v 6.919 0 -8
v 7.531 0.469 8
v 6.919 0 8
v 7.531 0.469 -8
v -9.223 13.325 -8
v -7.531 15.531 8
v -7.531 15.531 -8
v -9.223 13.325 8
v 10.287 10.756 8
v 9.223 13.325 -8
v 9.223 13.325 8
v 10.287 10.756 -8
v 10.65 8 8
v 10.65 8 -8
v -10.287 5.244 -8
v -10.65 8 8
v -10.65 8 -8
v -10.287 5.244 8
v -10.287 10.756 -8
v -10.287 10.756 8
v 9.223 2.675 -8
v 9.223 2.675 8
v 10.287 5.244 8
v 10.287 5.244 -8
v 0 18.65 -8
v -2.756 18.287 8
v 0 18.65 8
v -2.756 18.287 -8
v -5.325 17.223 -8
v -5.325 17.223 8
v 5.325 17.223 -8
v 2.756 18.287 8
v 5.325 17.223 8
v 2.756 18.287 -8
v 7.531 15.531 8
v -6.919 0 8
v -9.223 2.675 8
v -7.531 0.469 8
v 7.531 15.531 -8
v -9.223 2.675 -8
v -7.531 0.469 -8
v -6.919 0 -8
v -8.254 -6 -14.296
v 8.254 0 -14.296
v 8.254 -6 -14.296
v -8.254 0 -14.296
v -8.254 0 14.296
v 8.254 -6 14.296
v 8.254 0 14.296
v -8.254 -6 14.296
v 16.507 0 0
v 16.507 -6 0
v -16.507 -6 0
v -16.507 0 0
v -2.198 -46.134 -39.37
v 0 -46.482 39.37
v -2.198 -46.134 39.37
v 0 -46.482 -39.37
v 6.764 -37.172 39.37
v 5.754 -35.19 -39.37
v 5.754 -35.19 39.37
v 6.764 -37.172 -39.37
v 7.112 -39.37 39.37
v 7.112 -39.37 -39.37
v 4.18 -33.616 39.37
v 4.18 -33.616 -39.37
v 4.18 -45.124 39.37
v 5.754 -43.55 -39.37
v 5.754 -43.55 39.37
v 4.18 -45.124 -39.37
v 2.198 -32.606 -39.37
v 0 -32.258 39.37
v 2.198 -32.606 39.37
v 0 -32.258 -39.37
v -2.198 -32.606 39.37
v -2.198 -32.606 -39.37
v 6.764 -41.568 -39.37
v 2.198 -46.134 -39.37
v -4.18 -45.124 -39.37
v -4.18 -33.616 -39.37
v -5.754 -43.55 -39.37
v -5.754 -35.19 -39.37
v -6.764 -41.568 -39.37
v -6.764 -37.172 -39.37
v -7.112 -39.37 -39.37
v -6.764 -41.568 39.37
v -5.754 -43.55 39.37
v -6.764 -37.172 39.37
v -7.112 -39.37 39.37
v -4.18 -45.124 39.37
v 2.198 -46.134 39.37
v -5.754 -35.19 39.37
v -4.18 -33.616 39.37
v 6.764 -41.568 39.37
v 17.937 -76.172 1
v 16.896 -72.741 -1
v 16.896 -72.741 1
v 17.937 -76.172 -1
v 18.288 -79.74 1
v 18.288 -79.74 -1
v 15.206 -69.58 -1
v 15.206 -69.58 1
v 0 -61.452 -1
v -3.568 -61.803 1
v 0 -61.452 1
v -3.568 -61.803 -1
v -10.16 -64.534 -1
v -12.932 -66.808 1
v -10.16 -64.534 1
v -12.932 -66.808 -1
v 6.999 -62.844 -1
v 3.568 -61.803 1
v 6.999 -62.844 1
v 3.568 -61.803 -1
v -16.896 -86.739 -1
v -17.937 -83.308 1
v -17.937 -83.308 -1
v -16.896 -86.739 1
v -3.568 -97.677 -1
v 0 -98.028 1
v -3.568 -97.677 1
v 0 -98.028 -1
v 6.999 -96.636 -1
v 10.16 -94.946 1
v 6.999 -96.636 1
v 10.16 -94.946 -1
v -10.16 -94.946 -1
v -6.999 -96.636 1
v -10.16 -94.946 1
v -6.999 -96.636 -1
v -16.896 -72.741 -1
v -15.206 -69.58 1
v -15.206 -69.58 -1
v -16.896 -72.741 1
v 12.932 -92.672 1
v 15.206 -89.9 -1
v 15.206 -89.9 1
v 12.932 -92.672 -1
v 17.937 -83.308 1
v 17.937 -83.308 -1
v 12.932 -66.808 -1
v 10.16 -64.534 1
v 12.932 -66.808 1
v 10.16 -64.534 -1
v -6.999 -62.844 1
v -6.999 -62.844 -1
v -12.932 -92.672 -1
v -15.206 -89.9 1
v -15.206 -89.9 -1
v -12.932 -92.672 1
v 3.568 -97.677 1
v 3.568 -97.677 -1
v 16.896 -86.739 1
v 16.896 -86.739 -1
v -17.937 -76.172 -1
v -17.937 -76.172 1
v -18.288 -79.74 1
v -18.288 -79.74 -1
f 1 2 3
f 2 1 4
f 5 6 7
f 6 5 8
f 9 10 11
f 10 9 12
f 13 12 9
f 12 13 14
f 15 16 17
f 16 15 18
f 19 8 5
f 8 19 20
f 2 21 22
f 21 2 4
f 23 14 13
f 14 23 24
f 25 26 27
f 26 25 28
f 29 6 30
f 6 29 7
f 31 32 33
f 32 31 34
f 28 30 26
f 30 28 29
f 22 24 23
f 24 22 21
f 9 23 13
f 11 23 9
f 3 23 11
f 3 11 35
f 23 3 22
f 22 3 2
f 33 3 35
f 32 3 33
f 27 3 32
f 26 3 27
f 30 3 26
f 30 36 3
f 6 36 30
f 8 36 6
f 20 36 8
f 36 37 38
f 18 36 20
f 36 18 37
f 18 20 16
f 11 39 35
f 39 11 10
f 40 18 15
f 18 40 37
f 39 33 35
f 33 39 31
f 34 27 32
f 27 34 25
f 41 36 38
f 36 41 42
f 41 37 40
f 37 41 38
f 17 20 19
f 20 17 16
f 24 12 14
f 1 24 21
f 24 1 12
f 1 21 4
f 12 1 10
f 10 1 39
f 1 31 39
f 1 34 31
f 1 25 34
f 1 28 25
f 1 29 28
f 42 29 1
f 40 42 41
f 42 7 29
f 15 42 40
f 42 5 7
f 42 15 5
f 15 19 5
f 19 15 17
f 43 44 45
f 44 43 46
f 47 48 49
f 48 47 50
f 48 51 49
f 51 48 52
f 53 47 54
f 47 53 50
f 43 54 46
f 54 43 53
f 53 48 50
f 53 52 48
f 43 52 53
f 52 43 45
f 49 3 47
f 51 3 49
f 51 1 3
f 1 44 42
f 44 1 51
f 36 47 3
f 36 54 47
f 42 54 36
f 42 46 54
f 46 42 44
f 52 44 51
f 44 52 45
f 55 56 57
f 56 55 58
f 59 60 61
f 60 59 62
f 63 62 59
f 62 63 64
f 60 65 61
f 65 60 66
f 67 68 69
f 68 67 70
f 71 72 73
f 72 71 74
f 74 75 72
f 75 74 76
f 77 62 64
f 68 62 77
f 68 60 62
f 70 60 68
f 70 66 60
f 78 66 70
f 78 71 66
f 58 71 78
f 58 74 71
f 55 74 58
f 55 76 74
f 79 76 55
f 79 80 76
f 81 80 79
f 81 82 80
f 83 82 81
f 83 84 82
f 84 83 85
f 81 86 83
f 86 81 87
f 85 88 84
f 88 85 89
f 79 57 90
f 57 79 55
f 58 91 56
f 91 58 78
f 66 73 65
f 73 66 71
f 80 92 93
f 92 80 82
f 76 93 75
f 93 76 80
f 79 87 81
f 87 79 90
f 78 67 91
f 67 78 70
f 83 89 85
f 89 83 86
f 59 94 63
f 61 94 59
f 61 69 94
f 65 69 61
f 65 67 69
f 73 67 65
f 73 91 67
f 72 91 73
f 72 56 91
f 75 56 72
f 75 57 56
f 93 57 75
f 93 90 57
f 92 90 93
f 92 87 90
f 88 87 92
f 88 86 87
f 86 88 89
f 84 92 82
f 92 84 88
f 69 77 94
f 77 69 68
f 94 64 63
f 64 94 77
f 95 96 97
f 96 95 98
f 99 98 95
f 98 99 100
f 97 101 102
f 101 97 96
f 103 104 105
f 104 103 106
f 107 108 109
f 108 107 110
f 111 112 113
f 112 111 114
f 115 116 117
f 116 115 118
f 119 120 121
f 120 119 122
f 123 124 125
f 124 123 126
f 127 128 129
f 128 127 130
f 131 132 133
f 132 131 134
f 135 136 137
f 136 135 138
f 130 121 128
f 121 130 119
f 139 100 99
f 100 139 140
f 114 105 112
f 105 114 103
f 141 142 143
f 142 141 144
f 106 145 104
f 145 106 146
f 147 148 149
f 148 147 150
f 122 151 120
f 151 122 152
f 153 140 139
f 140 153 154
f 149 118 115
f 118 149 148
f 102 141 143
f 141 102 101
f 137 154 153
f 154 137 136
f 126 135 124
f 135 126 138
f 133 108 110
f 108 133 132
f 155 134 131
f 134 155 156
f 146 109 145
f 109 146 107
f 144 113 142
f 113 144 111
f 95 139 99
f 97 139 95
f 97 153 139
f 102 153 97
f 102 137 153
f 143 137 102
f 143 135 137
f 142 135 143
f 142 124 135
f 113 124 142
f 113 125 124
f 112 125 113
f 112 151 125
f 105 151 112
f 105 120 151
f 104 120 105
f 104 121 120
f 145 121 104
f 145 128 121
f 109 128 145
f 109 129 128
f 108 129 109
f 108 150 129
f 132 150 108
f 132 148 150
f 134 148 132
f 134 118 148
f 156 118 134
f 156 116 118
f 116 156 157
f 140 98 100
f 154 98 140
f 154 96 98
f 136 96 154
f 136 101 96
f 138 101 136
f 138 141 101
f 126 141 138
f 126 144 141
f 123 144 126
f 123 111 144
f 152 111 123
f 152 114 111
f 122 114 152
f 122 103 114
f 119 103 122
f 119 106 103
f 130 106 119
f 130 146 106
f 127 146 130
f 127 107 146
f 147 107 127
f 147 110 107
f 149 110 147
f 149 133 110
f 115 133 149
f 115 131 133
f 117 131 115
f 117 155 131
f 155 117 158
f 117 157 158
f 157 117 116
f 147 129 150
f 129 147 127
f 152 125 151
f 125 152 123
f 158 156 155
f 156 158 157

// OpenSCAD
// Auto-generated by scripts/author_from_manifest.py (Phase D.3).
// Source: data/phase_d_manifest.json (sku_intent='tyco-ty8226-esfr-pendent-k224-165f').
// Do not hand-edit — regenerate from the manifest.
//
// @part tyco_ty8226_esfr_pendent_k224_165f
// @kind sprinkler_head
// @category head.pendant.k224
// @display-name "Tyco TY8226 ESFR Pendent K22.4 165°F"
// @mfg tyco_fire_protection
// @mfg-pn TY8226
// @listing UL FM
// @hazard-classes ESFR
// @price-usd 78.00
// @install-minutes 14
// @crew journeyman
// @k-factor 22.4
// @orientation pendant
// @response quick
// @temperature 165F
// @param size_in number default=0.5 label="Size" unit="in"
// @port inlet position=[0,0.014,0] direction=[0,1,0] style=NPT_threaded size_in=1 role=drop

size_in = 0.5;
k_factor = 22.4;

length_mm   = 78.74;
body_dia_mm = 40.64;
thread_od   = 21.3;
thread_len  = 16;
deflector_d = body_dia_mm * 0.9;

 union() {
    translate([0, thread_len/2, 0])
        cylinder(h = thread_len, d = thread_od, center = true, $fn = 24);
    translate([0, -3, 0])
        rotate([90, 0, 0])
        cylinder(h = 6, d = thread_od * 1.55, $fn = 6, center = true);
    translate([0, -length_mm/2, 0])
        cylinder(h = length_mm, d = body_dia_mm * 0.35, center = true, $fn = 20);
    translate([0, -length_mm - 1, 0])
        cylinder(h = 2, d = deflector_d, center = true, $fn = 32);
}
